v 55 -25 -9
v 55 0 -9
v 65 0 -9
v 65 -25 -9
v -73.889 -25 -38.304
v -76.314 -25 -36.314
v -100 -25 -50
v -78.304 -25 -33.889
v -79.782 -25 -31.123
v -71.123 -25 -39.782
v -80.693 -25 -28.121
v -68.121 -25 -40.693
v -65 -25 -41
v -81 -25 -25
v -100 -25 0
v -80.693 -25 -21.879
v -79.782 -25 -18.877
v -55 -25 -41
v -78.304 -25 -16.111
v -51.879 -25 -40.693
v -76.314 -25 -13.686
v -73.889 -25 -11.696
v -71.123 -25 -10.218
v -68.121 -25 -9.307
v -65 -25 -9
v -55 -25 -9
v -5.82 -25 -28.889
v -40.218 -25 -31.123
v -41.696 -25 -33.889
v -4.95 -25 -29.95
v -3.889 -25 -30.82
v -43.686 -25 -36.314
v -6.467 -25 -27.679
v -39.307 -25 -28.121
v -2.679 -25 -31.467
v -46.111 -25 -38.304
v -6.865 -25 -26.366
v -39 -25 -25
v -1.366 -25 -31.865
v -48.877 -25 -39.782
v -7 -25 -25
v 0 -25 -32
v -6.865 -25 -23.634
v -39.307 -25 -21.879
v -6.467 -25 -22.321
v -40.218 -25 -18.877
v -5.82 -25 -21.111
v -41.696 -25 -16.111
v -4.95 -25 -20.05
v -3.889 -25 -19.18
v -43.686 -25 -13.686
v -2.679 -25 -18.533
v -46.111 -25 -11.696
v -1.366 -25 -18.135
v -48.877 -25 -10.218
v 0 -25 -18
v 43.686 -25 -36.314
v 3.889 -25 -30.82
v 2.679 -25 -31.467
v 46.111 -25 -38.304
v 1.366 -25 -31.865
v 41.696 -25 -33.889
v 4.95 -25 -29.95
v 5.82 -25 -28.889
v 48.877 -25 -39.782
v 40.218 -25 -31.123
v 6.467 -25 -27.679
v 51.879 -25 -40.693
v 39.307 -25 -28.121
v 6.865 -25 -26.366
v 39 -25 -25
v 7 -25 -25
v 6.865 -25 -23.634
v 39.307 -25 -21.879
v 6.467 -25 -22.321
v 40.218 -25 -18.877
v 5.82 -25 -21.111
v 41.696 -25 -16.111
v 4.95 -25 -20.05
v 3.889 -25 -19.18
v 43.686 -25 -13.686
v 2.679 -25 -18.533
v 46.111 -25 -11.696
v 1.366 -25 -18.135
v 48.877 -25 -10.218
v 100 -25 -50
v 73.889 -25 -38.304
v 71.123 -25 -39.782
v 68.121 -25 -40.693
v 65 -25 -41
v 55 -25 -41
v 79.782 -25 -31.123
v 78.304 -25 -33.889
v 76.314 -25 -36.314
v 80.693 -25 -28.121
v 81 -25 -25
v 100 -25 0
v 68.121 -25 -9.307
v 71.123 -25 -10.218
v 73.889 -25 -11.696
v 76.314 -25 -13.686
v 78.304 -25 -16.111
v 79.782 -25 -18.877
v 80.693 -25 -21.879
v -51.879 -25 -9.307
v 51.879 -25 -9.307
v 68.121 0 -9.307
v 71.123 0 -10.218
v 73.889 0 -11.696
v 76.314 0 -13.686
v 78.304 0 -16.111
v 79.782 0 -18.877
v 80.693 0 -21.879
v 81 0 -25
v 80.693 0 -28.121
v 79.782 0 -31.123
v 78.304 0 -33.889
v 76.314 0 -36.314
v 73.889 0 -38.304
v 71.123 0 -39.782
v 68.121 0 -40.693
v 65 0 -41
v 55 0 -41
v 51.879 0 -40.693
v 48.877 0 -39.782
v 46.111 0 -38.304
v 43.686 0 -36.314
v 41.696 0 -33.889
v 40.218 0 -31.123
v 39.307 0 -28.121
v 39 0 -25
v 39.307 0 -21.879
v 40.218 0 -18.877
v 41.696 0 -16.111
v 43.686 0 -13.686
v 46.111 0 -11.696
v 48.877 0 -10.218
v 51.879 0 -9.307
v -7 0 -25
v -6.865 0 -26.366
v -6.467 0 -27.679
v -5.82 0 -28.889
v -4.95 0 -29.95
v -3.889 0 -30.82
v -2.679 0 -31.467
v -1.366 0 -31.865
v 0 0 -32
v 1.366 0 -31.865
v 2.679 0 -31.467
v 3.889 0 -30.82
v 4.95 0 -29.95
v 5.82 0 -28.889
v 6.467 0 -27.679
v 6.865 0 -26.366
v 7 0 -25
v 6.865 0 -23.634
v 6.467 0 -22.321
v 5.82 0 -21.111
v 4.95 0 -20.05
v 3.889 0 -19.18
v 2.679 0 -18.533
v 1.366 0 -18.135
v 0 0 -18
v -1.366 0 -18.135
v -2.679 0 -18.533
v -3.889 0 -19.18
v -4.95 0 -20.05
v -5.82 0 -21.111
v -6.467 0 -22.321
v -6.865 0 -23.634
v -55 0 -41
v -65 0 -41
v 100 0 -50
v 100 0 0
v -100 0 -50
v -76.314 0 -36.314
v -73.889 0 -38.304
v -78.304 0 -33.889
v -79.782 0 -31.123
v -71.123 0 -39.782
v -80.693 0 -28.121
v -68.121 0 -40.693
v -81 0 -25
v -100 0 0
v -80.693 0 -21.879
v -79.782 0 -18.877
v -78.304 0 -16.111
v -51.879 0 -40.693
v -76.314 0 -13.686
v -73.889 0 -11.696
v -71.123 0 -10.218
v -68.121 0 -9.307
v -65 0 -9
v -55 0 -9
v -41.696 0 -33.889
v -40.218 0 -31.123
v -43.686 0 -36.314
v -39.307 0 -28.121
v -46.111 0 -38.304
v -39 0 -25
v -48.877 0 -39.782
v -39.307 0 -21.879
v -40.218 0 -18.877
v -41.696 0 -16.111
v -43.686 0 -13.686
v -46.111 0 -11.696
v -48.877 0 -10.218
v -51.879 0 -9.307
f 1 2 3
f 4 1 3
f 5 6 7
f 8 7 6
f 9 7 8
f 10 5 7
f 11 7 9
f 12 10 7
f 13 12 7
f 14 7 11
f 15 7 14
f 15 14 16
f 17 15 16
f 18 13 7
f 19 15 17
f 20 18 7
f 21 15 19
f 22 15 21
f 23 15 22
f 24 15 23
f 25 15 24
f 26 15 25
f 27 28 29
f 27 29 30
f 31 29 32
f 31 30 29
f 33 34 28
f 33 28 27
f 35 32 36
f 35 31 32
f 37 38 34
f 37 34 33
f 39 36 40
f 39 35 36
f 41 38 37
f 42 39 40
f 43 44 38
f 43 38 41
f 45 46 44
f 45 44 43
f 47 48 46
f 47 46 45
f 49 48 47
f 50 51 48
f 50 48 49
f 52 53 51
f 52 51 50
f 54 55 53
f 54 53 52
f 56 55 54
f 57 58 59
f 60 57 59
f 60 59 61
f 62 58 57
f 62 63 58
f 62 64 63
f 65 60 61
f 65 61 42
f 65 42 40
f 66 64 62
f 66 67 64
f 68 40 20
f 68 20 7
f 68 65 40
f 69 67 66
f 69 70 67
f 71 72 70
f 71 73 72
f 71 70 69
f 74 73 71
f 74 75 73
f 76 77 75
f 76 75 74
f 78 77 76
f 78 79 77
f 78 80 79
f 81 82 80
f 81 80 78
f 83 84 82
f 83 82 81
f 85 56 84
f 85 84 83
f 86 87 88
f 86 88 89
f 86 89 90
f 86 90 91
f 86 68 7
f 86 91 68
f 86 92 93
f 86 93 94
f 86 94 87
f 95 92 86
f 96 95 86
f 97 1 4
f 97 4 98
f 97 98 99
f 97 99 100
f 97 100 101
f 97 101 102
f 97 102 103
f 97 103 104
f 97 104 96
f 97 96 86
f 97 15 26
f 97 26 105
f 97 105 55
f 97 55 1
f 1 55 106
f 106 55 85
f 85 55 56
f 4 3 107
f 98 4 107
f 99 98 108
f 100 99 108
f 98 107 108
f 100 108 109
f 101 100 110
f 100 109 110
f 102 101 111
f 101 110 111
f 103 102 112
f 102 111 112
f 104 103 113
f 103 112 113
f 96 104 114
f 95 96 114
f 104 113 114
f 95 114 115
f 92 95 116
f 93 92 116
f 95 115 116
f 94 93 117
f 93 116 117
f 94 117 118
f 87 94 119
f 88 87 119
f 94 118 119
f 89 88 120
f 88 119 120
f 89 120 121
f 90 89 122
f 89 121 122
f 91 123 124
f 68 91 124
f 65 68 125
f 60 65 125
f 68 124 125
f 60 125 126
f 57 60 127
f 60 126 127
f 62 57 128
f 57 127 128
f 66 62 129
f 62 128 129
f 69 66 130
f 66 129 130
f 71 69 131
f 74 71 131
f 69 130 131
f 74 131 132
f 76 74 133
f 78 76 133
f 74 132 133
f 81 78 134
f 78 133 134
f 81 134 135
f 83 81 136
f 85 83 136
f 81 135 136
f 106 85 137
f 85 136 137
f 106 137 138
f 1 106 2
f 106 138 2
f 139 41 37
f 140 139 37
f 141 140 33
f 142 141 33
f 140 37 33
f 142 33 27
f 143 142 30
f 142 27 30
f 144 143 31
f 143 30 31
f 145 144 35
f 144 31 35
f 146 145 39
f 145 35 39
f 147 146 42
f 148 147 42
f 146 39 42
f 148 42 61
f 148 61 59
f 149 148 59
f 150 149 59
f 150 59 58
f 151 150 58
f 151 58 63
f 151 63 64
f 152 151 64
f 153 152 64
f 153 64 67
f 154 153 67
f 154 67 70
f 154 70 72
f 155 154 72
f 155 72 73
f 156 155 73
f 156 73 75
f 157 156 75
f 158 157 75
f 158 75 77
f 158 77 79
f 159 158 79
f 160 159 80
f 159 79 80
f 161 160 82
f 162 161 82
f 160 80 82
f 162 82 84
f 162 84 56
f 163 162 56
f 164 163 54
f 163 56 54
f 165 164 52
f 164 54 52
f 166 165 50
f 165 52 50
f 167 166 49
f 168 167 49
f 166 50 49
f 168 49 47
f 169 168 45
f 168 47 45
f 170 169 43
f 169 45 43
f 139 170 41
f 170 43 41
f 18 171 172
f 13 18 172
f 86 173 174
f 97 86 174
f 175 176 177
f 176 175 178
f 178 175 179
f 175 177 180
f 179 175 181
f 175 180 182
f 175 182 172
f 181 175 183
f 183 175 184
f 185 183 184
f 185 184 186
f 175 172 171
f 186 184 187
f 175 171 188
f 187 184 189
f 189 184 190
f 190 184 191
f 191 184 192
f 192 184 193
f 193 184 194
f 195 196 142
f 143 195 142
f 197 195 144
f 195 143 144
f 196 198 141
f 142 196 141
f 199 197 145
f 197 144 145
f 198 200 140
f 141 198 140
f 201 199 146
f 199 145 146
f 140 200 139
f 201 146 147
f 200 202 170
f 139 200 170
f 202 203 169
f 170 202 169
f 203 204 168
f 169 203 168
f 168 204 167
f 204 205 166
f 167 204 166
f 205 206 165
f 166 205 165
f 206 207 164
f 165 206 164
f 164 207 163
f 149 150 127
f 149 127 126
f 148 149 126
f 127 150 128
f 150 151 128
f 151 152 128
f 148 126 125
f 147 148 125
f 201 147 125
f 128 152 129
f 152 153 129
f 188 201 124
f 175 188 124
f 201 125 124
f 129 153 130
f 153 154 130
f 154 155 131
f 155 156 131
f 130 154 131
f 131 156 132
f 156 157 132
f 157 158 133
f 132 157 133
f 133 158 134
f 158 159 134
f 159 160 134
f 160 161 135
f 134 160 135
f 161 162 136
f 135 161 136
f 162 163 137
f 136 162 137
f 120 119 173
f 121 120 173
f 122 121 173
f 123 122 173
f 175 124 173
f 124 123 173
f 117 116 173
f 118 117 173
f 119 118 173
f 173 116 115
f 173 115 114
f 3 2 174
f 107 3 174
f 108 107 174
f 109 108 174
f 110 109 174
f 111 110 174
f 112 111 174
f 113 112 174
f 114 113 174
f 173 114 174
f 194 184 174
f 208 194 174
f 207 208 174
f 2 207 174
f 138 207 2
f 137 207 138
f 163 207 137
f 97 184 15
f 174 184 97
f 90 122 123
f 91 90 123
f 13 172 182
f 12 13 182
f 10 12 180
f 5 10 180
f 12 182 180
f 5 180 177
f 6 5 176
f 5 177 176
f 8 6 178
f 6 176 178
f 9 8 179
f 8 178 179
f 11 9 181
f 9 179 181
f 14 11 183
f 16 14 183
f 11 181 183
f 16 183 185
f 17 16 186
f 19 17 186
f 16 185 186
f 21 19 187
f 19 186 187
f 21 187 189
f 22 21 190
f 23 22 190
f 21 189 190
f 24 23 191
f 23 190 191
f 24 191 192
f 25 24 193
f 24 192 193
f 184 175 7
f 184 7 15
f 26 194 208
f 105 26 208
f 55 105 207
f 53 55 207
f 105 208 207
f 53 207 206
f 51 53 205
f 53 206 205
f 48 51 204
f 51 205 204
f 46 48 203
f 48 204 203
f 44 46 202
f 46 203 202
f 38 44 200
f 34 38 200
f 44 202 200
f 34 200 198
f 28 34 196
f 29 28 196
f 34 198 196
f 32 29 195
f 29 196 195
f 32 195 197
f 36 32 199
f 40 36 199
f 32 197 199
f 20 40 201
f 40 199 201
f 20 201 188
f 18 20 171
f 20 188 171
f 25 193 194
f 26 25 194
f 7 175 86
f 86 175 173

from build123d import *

# Parameters (mm, degrees)
F0_W     = 200
F0_H     = 50
F1_DEPTH = 25
F2_D     = 14


with BuildPart() as f1:
    # F0 (on Front) → F1 (new body)
    with BuildSketch(Plane.XZ):
        with Locations((0, -25)):
            Rectangle(F0_W, F0_H)
        with BuildLine():
            Line((-55, -41), (-65, -41))
            ThreePointArc((-65, -41), (-81, -25), (-65, -9))
            Line((-65, -9), (-55, -9))
            ThreePointArc((-55, -9), (-39, -25), (-55, -41))
        make_face(mode=Mode.SUBTRACT)
        with BuildLine():
            Line((55, -9), (65, -9))
            ThreePointArc((65, -9), (81, -25), (65, -41))
            Line((65, -41), (55, -41))
            ThreePointArc((55, -41), (39, -25), (55, -9))
        make_face(mode=Mode.SUBTRACT)
    extrude(amount=F1_DEPTH)

    # F2 (through all)
    with Locations(Plane(origin=(0, 0, 0), x_dir=(1, 0, 0), z_dir=(0, 1, 0))):
        with Locations((0, 25)):
            Hole(F2_D / 2)


solid = f1.part
